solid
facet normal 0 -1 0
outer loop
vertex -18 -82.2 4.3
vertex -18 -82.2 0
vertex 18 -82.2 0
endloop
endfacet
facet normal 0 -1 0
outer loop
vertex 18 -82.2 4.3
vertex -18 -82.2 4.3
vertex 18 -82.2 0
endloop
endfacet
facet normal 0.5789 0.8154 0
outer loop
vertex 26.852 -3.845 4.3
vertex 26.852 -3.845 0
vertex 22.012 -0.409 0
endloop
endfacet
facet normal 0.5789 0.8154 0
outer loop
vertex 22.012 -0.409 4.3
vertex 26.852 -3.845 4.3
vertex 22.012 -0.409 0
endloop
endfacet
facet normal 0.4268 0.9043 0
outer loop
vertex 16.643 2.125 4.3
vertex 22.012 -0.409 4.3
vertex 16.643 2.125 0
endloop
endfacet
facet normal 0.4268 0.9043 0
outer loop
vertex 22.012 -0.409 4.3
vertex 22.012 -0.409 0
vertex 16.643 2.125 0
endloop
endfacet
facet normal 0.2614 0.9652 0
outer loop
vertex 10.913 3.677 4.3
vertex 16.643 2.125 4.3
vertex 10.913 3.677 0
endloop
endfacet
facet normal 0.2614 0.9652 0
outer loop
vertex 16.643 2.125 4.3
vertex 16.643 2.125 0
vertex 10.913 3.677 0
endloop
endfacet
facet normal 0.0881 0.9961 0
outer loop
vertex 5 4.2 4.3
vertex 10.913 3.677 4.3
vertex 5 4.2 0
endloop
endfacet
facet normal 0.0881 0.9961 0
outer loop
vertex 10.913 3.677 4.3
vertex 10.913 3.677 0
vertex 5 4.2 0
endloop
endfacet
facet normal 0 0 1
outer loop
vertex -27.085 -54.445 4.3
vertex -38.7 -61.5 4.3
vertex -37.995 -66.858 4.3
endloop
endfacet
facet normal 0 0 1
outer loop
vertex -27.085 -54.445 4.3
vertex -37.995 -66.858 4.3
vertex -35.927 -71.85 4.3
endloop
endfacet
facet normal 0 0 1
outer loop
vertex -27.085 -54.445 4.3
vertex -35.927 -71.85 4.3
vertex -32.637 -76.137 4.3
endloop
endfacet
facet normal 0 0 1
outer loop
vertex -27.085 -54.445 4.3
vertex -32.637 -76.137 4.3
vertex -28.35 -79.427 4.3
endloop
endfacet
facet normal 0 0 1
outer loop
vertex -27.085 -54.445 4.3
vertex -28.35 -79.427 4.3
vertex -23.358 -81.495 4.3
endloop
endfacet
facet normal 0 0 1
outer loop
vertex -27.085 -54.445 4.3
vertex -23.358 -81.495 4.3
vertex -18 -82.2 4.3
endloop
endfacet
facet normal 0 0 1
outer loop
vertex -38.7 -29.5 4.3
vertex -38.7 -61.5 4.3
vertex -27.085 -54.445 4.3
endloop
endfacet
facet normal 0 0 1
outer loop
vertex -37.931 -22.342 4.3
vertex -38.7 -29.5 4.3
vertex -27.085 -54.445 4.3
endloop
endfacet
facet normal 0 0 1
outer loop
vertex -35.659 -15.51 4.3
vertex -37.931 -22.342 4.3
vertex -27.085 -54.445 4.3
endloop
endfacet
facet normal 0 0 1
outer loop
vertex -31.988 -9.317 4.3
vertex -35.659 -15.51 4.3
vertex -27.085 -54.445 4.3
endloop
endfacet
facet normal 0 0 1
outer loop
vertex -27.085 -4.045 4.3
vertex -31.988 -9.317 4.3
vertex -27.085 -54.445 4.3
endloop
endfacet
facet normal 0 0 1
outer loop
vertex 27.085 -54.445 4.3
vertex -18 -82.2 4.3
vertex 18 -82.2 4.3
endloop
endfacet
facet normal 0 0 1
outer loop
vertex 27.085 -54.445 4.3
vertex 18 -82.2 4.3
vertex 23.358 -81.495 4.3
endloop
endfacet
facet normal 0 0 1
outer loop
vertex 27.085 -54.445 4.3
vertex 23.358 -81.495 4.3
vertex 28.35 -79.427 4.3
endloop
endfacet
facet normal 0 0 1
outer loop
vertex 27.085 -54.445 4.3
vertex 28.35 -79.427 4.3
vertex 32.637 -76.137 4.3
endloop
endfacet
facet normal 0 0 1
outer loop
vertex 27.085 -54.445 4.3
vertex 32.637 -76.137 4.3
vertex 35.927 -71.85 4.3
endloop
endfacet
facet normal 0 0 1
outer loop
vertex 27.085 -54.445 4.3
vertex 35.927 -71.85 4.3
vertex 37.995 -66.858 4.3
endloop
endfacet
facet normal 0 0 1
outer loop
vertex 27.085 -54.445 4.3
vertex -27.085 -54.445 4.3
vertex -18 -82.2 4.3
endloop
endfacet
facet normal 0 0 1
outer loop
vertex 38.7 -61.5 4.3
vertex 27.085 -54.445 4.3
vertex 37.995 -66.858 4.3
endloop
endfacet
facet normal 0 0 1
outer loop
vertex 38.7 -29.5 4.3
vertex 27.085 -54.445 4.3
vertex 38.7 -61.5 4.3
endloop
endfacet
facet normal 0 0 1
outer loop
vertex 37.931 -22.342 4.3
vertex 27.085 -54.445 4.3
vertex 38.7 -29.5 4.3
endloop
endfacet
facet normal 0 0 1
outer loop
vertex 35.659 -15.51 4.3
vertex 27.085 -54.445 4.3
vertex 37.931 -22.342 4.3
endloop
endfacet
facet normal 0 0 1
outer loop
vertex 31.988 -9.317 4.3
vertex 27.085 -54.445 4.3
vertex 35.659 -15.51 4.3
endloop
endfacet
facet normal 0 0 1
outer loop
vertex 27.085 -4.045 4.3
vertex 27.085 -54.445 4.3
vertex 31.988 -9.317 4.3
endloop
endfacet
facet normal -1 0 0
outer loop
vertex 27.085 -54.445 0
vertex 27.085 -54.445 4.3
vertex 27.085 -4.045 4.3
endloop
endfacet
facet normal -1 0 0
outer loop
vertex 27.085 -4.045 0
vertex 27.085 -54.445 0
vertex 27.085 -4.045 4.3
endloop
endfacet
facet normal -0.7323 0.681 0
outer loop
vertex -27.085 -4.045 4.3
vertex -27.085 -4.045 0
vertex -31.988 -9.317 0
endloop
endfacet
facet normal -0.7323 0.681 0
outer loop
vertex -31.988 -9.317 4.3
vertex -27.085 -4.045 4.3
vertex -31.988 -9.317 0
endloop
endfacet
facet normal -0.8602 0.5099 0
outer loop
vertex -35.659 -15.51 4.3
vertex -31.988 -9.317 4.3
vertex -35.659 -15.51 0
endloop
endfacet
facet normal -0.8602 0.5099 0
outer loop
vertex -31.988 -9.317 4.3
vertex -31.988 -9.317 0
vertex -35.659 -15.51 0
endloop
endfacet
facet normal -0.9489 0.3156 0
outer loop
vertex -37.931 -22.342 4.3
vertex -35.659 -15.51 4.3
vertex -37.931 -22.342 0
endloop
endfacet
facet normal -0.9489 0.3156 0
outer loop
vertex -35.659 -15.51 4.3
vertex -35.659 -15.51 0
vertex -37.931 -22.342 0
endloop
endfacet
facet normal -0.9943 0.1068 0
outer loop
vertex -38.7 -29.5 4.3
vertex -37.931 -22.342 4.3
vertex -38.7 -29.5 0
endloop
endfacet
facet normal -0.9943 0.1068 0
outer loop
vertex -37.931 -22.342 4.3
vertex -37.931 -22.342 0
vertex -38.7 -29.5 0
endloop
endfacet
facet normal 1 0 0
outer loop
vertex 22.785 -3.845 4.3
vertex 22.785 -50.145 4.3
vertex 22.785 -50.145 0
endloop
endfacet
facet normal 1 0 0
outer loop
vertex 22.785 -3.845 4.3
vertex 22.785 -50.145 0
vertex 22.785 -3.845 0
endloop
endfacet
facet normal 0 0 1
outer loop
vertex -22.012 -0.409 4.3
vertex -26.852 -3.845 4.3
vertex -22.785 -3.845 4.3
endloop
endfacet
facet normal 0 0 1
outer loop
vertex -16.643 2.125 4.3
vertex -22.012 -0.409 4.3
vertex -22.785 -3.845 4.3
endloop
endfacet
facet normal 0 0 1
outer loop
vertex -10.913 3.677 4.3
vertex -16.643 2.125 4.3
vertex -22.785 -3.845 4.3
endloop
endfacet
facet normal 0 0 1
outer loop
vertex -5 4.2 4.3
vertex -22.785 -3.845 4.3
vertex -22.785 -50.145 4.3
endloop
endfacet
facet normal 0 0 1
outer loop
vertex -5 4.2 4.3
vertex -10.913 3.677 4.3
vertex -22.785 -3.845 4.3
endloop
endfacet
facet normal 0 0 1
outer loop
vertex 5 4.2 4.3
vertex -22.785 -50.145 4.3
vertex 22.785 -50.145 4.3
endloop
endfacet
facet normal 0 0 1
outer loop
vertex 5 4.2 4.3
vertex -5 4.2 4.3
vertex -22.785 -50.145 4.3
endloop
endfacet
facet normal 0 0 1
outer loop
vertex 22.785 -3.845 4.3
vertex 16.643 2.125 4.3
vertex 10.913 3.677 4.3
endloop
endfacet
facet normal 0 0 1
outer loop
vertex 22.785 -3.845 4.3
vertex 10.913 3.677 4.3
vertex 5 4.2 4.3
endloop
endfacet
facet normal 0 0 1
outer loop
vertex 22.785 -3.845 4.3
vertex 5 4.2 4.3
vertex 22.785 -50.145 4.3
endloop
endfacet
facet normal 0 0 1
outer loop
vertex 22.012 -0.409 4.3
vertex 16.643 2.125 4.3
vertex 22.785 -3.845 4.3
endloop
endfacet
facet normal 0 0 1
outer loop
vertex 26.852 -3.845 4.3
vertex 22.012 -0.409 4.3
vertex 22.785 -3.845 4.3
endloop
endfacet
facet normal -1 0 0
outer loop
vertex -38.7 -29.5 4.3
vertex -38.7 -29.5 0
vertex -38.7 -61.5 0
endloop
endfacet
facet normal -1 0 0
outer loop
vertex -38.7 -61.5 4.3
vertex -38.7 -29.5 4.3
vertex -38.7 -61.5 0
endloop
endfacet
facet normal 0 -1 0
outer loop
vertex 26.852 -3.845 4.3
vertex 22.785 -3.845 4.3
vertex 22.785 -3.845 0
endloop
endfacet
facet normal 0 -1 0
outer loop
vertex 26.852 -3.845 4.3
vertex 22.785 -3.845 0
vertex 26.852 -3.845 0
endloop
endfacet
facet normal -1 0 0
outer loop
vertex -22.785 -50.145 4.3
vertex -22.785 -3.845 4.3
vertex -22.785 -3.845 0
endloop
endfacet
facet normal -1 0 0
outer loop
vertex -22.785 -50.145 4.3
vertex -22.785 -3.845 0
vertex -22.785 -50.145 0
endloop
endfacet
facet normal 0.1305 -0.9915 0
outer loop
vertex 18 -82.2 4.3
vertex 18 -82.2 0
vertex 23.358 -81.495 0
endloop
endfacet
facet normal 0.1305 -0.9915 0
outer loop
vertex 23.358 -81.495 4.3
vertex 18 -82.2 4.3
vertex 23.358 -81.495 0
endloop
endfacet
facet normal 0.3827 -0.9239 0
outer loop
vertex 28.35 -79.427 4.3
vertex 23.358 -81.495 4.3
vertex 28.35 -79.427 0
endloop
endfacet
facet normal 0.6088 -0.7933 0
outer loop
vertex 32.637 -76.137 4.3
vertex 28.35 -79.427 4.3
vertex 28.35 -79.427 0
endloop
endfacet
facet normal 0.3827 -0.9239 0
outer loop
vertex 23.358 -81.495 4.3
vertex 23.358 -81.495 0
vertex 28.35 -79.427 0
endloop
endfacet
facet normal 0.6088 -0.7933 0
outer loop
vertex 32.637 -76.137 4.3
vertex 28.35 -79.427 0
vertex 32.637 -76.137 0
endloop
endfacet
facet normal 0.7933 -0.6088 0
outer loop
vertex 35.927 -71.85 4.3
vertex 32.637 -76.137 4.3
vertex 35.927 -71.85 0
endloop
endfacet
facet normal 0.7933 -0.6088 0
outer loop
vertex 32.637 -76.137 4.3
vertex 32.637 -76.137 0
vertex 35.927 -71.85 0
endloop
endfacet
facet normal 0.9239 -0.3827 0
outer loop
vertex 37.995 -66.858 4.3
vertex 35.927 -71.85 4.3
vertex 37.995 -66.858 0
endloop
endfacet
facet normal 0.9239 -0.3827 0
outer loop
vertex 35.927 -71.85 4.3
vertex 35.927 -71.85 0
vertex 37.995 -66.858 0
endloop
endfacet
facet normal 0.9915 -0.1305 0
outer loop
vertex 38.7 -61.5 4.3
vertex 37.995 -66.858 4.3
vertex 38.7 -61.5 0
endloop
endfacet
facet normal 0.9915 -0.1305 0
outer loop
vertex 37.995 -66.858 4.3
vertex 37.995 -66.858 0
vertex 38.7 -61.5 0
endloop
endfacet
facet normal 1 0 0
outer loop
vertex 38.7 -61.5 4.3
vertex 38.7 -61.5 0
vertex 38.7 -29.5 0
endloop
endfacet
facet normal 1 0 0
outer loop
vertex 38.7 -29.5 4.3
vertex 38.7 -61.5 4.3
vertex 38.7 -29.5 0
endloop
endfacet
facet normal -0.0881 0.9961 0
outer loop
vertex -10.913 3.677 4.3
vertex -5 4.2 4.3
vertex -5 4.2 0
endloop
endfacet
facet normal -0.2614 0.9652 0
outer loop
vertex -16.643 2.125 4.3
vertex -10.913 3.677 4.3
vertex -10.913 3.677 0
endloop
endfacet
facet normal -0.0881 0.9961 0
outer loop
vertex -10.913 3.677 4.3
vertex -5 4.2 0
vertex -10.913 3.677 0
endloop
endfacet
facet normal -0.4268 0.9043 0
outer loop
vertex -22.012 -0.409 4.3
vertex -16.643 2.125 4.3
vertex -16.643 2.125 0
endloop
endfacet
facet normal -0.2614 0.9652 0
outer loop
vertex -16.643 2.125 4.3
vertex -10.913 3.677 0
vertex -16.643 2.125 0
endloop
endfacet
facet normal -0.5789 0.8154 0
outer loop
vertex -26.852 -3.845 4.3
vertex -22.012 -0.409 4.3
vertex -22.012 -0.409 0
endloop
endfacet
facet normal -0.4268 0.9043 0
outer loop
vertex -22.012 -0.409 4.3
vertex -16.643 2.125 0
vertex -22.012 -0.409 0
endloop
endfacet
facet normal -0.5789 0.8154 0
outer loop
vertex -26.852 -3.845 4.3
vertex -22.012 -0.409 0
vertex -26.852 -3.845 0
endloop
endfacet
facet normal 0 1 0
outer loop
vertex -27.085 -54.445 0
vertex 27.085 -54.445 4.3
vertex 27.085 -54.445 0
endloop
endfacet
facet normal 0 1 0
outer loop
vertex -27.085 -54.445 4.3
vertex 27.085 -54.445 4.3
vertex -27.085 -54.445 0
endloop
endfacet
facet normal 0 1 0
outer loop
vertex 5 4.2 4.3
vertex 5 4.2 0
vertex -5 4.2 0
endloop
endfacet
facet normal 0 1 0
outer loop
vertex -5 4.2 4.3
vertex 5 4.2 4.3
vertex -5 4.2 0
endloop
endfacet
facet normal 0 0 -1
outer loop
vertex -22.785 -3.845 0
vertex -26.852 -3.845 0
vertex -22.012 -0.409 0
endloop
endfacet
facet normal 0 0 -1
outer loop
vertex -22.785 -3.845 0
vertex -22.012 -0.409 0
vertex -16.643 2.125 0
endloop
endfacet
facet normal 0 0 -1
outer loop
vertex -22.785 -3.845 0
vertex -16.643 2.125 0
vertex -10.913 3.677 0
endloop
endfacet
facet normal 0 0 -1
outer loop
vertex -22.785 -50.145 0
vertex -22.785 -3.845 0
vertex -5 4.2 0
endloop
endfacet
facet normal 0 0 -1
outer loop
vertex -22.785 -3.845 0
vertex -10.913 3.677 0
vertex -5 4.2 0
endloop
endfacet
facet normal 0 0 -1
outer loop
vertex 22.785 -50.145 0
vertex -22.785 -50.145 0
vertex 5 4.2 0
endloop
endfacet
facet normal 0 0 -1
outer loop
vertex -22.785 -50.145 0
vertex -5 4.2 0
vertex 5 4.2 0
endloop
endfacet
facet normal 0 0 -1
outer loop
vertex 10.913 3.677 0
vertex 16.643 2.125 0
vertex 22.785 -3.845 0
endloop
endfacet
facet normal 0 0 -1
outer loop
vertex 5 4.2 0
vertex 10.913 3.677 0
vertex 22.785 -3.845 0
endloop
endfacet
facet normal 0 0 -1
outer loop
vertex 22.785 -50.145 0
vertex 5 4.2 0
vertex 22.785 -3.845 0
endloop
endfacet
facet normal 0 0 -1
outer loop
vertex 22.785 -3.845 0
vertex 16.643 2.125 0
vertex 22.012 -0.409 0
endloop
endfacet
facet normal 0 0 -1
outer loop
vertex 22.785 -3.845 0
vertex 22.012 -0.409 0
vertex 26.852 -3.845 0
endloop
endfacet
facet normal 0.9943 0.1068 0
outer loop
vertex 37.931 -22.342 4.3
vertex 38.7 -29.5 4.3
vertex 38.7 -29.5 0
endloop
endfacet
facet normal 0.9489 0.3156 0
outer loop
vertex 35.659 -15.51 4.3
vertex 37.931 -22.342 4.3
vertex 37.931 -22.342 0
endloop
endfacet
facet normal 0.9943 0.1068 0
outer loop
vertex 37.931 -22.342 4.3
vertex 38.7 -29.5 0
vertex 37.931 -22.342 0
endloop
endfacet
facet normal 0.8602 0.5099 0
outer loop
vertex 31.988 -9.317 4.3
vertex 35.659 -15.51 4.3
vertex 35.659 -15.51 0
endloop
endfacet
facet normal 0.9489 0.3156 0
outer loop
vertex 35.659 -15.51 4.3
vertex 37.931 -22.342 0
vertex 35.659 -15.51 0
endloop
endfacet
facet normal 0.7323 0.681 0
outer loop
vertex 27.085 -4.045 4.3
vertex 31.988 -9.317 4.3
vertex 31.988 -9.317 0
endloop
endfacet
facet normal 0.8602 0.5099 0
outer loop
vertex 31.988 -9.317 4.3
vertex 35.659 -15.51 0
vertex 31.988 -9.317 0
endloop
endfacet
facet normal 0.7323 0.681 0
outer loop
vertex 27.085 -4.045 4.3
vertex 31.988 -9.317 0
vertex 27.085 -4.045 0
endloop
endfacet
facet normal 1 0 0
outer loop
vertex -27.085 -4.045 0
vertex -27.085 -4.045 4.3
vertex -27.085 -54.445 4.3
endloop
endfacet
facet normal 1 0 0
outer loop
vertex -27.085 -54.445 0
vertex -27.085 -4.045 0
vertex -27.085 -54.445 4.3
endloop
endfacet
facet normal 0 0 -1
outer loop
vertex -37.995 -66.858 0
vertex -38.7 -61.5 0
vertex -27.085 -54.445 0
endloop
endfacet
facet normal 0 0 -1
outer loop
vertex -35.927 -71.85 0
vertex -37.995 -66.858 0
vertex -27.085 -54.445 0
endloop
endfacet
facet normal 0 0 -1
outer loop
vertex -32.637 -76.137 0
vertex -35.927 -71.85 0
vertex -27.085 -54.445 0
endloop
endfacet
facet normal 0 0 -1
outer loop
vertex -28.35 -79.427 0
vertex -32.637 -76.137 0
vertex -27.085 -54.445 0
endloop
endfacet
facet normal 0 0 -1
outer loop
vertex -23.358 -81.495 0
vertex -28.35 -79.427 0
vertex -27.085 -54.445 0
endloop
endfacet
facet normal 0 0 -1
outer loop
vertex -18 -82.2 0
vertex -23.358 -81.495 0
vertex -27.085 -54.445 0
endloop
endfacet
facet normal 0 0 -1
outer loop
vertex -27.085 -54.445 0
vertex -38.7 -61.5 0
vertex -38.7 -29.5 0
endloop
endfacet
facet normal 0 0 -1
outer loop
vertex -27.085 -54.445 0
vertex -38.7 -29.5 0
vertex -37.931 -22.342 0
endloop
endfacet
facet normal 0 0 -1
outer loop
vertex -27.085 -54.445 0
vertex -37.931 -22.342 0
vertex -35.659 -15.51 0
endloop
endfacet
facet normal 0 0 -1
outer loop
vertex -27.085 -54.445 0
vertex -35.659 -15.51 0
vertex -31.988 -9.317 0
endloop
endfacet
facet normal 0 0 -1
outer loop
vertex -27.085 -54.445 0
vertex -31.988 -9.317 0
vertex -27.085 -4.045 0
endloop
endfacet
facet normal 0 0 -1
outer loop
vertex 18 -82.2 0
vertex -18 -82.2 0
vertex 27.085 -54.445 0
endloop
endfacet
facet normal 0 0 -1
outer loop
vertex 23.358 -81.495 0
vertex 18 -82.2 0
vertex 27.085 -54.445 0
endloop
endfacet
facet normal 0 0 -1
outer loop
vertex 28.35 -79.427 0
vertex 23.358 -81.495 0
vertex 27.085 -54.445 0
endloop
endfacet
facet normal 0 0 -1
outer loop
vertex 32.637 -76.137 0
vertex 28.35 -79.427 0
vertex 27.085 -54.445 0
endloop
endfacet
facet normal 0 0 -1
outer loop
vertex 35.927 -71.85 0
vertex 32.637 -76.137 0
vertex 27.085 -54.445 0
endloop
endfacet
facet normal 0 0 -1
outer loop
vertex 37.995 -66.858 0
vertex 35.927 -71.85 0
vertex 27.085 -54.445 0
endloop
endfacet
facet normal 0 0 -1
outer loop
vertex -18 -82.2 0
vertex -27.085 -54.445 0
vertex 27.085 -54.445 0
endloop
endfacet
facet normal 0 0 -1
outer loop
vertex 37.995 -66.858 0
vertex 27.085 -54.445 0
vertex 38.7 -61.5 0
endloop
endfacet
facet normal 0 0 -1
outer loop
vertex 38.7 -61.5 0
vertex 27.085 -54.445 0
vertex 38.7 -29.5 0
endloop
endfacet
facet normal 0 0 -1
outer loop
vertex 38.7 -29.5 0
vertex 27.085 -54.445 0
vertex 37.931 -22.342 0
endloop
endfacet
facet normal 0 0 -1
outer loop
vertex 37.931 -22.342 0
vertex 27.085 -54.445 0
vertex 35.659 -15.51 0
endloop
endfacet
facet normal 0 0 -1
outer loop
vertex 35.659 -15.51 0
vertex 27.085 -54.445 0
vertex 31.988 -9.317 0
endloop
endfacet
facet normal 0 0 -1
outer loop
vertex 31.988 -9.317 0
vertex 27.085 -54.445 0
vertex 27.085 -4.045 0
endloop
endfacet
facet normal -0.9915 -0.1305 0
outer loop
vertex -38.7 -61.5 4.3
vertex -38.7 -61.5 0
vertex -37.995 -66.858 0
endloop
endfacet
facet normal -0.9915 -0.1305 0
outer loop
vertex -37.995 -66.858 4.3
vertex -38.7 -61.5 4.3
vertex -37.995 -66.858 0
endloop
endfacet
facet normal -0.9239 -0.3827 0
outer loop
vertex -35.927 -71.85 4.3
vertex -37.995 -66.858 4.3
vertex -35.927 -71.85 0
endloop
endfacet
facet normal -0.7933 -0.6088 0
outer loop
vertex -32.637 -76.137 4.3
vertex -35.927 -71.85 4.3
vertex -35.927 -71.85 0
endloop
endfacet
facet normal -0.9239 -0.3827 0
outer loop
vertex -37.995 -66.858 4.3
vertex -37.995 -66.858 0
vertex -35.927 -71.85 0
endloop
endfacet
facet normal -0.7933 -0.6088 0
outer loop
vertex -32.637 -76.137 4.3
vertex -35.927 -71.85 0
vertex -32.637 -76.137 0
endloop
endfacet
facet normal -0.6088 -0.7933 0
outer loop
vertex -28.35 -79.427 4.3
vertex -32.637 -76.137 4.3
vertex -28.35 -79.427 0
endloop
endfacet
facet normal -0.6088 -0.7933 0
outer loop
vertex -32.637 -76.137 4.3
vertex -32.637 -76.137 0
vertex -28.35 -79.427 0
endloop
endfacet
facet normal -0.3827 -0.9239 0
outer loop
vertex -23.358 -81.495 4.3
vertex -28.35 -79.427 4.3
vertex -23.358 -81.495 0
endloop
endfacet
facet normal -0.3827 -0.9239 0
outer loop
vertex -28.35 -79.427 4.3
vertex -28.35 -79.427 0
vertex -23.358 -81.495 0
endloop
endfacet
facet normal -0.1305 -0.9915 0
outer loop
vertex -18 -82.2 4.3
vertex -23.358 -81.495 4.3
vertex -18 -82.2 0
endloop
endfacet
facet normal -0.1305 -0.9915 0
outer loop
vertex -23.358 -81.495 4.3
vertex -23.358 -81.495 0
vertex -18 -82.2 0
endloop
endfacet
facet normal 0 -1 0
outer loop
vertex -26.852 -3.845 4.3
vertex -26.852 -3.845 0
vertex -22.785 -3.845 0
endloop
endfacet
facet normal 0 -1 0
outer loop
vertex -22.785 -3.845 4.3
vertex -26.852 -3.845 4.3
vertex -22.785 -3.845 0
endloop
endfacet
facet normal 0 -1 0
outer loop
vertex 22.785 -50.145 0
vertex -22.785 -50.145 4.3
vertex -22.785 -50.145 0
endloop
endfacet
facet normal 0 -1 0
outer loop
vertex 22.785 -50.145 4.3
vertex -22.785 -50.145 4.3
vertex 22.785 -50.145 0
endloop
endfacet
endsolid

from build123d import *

# Parameters (mm, degrees)
BOSS_EXTRUDE1_DEPTH = 4.3
CUT_EXTRUDE1_DEPTH  = 10


with BuildPart() as part:
    # Sketch1 → Boss-Extrude1 (new body)
    with BuildSketch(Plane.XY):
        with BuildLine():
            Line((-18, -82.2), (-0.5, -82.2))
            Line((-0.5, -82.2), (0.5, -82.2))
            Line((0.5, -82.2), (18, -82.2))
            ThreePointArc((18, -82.2), (32.637110371, -76.137110371), (38.7, -61.5))
            Line((38.7, -61.5), (38.7, -29.5))
            ThreePointArc((38.7, -29.5), (28.829498526, -5.670501474), (5, 4.2))
            Line((5, 4.2), (-5, 4.2))
            ThreePointArc((-5, 4.2), (-28.829498526, -5.670501474), (-38.7, -29.5))
            Line((-38.7, -29.5), (-38.7, -61.5))
            ThreePointArc((-38.7, -61.5), (-32.637110371, -76.137110371), (-18, -82.2))
        make_face()
    extrude(amount=BOSS_EXTRUDE1_DEPTH)

    # Sketch2 → Cut-Extrude1 (cut)
    with BuildSketch(Plane.XY.offset(4.3)):
        Polygon((-27.085, -4.045279907), (-27.085, -3.845279907), (-22.785, -3.845279907), (-22.785, -50.145279907), (22.785, -50.145279907), (22.785, -3.845279907), (27.085, -3.845279907), (27.085, -4.045279907), (27.085, -54.445279907), (-27.085, -54.445279907), align=None)
    extrude(amount=-CUT_EXTRUDE1_DEPTH, mode=Mode.SUBTRACT)


solid = part.part
